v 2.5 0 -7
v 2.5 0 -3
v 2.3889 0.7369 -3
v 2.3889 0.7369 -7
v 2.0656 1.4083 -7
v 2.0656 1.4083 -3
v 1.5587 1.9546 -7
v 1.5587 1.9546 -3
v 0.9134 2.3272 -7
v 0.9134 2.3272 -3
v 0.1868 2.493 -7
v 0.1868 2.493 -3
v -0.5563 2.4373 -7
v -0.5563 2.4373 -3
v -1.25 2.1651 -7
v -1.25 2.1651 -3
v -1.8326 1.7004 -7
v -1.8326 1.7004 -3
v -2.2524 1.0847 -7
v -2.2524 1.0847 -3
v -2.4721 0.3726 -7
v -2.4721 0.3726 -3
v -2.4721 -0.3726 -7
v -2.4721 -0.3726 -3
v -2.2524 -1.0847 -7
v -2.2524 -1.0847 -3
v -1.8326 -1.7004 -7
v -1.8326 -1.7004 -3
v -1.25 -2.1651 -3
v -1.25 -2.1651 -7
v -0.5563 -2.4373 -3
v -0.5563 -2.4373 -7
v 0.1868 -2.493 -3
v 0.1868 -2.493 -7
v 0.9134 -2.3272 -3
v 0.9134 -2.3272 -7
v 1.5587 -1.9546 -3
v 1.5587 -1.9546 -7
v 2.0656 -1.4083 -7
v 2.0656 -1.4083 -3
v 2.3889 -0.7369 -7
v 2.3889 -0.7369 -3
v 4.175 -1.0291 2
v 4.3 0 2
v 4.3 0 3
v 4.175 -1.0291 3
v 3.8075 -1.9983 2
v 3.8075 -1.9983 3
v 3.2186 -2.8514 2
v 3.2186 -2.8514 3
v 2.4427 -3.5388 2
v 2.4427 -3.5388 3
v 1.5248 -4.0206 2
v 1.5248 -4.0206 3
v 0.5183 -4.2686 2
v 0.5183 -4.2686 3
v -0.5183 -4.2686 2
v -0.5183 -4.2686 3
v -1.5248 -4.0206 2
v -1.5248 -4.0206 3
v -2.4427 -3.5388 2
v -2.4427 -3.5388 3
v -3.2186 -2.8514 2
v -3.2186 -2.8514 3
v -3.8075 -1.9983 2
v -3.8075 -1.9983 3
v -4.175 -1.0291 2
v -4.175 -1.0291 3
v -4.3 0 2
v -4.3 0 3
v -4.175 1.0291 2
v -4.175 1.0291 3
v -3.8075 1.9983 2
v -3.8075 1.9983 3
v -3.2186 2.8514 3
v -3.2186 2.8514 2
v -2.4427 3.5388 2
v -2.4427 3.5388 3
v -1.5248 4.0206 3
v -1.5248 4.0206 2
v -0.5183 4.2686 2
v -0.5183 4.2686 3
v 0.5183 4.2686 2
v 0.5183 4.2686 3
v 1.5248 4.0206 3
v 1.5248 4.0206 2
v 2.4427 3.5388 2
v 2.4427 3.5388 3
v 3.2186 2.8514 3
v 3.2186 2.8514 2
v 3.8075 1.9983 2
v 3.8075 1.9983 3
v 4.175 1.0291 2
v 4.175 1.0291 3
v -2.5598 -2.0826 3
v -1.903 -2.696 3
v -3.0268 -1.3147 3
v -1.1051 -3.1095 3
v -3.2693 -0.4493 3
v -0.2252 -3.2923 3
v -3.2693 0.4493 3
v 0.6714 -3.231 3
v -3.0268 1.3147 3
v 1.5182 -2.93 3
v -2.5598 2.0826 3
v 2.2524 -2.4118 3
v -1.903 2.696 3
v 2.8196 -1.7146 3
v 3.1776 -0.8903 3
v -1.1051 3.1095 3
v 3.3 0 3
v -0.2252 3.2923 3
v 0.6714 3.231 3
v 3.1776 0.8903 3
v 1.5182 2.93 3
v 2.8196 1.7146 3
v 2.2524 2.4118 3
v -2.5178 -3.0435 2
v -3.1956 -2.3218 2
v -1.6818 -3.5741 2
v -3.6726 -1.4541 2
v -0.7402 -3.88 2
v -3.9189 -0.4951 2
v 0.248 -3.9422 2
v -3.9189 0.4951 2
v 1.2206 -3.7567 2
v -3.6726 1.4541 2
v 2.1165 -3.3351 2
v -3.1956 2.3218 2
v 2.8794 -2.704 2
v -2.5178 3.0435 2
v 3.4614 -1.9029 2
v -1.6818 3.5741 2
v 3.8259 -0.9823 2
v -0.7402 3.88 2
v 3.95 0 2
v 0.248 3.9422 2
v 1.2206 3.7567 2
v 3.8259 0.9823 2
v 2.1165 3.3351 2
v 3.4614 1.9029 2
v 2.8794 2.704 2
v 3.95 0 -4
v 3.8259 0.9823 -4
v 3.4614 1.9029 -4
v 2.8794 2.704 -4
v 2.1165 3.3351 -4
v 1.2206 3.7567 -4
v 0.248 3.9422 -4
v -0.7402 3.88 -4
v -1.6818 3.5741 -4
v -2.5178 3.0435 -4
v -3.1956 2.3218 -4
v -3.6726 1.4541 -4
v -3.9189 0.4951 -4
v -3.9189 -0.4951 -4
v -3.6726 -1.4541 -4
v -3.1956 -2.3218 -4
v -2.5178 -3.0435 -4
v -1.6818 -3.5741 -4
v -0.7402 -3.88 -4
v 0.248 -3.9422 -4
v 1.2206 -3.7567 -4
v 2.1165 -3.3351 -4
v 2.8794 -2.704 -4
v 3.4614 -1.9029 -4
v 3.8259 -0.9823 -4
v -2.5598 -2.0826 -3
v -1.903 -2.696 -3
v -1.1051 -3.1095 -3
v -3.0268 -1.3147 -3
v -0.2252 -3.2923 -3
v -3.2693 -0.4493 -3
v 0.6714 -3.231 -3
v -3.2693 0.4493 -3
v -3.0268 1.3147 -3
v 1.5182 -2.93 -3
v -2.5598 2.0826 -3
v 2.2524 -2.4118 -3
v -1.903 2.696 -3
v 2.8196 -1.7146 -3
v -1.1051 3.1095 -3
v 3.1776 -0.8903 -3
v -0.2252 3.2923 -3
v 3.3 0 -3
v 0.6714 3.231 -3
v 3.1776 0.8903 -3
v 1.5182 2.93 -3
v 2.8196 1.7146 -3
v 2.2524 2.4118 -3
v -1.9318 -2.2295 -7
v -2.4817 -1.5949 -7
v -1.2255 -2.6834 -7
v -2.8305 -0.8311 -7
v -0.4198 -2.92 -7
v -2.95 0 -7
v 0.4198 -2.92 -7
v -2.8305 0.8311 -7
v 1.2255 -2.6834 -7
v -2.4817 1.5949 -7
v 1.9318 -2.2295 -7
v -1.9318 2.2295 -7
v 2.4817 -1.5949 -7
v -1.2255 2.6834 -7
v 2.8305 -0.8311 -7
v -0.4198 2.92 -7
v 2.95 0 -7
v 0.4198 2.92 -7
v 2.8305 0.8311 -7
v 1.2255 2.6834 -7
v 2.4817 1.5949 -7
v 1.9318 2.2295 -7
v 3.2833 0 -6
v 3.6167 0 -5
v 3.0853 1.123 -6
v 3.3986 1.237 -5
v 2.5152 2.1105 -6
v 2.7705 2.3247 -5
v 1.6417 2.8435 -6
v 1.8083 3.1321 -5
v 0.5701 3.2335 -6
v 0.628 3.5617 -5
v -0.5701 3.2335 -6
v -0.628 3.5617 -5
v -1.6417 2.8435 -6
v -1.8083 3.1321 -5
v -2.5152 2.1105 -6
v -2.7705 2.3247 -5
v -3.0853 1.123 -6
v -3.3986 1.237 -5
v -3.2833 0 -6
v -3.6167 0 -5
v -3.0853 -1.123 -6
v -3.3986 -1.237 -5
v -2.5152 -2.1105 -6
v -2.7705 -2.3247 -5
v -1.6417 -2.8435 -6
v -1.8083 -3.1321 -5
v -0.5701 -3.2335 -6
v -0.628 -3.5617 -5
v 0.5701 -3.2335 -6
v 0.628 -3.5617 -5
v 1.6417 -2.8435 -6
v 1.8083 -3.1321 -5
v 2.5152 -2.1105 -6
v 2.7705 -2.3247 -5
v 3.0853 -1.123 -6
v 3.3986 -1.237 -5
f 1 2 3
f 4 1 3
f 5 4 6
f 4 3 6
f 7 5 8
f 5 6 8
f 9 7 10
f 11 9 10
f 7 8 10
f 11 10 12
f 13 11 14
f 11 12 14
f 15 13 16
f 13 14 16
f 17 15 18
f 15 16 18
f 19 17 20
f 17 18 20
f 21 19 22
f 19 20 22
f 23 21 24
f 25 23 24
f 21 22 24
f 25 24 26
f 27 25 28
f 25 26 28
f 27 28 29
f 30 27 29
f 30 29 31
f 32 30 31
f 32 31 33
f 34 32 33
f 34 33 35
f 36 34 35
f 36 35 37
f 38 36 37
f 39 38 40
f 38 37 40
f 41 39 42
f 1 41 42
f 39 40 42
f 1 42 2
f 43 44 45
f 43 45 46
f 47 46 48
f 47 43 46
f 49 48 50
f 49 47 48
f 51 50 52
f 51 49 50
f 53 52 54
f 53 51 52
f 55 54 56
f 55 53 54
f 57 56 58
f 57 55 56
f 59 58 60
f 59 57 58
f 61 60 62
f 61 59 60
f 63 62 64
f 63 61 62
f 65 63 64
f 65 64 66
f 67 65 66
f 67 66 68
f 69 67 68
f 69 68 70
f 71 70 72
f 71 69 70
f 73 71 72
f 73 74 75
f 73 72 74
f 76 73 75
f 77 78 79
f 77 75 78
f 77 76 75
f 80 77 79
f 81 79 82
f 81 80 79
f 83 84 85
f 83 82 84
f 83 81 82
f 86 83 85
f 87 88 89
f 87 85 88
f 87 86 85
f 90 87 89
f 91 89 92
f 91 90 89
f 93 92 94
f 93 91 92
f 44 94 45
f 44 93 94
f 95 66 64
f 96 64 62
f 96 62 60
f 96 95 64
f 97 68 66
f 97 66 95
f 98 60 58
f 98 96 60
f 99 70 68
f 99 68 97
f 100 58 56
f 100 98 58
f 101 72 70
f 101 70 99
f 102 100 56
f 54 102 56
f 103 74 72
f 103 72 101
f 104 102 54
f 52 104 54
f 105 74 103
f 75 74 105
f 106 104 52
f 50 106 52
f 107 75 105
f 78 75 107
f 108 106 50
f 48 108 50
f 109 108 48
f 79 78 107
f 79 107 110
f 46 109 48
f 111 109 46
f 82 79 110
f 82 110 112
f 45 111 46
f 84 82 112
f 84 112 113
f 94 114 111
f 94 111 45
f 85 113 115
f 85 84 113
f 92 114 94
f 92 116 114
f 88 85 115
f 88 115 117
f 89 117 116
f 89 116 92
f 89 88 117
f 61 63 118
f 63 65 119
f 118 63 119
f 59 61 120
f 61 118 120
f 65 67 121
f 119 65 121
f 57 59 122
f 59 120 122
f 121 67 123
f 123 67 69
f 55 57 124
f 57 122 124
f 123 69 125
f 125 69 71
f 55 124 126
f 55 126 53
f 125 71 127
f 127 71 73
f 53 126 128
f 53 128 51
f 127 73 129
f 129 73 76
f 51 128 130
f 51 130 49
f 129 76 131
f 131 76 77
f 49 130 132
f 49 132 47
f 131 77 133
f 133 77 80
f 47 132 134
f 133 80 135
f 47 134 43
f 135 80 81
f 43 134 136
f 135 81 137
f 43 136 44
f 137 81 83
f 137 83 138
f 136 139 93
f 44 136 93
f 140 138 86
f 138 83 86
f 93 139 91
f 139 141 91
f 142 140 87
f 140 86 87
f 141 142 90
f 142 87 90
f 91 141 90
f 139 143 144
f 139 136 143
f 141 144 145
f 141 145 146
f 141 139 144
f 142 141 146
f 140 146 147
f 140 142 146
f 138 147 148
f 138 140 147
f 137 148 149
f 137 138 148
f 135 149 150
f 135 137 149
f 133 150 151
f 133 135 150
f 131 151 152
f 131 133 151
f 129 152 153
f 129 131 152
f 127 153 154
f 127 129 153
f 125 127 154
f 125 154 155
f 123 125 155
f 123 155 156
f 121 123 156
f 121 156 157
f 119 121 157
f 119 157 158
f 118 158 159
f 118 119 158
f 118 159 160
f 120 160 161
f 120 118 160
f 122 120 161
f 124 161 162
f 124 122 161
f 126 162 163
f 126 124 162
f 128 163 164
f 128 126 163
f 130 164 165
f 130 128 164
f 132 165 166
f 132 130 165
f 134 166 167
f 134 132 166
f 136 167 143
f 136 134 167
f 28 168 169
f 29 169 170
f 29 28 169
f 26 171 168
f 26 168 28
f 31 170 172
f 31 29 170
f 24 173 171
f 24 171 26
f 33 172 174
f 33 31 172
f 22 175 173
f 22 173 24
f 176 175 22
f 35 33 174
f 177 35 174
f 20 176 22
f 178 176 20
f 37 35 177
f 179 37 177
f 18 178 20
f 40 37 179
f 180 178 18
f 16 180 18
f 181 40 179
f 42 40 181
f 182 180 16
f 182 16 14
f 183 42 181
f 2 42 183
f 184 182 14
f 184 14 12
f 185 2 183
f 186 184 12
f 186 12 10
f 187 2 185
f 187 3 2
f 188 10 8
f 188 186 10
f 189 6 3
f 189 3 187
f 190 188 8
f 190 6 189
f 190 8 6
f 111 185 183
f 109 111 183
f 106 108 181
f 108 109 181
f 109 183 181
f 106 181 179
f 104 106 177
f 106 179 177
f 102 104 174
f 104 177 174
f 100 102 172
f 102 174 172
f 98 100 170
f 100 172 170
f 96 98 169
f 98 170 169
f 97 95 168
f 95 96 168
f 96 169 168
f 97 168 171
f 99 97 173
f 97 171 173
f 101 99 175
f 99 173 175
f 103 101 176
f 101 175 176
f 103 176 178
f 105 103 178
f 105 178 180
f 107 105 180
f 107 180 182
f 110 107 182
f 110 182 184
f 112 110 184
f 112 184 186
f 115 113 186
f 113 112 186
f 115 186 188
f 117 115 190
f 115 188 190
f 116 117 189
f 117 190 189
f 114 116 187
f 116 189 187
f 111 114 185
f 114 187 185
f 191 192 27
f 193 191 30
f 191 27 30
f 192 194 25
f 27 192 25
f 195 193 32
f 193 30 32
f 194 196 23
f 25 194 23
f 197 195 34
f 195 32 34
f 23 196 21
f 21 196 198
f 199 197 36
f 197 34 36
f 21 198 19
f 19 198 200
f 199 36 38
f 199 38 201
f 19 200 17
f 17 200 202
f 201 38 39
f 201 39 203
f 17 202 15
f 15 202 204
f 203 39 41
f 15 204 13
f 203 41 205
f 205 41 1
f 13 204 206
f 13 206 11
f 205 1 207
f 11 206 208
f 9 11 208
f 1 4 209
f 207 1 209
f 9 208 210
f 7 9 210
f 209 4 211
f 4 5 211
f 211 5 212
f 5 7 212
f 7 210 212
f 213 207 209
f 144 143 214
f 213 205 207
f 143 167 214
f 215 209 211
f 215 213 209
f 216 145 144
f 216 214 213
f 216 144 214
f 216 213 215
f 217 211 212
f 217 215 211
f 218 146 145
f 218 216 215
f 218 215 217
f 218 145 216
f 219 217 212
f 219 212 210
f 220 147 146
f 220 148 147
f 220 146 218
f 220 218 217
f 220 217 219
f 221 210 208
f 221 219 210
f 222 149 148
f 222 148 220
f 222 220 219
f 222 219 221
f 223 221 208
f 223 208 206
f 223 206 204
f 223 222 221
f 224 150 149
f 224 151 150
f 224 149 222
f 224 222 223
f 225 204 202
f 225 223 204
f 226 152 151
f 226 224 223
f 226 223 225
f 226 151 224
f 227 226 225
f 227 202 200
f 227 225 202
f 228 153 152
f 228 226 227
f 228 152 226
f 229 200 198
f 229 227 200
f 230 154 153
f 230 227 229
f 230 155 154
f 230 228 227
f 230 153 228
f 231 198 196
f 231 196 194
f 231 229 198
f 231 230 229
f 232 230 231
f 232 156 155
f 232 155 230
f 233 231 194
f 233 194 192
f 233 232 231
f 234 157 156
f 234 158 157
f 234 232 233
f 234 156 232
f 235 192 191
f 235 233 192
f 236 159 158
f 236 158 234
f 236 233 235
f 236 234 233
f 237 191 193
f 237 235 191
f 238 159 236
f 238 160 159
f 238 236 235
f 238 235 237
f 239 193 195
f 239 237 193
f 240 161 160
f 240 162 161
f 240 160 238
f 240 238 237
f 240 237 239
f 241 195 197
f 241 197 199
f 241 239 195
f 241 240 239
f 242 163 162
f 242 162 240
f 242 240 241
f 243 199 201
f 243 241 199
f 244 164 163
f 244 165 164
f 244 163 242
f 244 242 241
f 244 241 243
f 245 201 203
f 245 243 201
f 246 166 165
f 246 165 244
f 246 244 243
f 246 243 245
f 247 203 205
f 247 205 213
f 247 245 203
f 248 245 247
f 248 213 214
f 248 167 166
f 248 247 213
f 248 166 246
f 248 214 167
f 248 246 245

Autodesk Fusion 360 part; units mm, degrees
sketch "Sketch1" plane through (0, 0, 0) normal (0, 0, 1) x (1, 0, 0)
  circle A0 centre (0, 0) radius 4.3
  circle A1 centre (0, 0) radius 3.95
  circle A2 centre (0, 0) radius 2.5
  circle A3 centre (0, 0) radius 3.3
  circle A4 centre (0, 0) radius 2.843
  circle A5 centre (0, 0) radius 2.75
  dimension "d1" = 8.6
  dimension "d2" = 7.9
  dimension "d3" = 5
  dimension "d4" = 6.6
  dimension "d14" = 5.5
extrude "Extrude3" add sketch "Sketch1" against normal blind 7 contours A1 | A3 | A4 | A5
extrude "Extrude4" add sketch "Sketch1" along normal blind 3 contours A0 | A1
extrude "Extrude5" add sketch "Sketch1" against normal blind 0.5 contours A3 | A4
extrude "Extrude7" cut 1 faces at (3.0117, -0.2881, 0) along direction (0, 0, -1) blind 3
extrude "Extrude8" cut 1 faces at (4.1673, -0.2136, 0) along direction (0, 0, 1) blind 2
chamfer "Chamfer1" distance 1 distance2 3 1 edges at (-3.6827, 1.4284, -7) measured on face at (3.4427, -0.3204, -7)
